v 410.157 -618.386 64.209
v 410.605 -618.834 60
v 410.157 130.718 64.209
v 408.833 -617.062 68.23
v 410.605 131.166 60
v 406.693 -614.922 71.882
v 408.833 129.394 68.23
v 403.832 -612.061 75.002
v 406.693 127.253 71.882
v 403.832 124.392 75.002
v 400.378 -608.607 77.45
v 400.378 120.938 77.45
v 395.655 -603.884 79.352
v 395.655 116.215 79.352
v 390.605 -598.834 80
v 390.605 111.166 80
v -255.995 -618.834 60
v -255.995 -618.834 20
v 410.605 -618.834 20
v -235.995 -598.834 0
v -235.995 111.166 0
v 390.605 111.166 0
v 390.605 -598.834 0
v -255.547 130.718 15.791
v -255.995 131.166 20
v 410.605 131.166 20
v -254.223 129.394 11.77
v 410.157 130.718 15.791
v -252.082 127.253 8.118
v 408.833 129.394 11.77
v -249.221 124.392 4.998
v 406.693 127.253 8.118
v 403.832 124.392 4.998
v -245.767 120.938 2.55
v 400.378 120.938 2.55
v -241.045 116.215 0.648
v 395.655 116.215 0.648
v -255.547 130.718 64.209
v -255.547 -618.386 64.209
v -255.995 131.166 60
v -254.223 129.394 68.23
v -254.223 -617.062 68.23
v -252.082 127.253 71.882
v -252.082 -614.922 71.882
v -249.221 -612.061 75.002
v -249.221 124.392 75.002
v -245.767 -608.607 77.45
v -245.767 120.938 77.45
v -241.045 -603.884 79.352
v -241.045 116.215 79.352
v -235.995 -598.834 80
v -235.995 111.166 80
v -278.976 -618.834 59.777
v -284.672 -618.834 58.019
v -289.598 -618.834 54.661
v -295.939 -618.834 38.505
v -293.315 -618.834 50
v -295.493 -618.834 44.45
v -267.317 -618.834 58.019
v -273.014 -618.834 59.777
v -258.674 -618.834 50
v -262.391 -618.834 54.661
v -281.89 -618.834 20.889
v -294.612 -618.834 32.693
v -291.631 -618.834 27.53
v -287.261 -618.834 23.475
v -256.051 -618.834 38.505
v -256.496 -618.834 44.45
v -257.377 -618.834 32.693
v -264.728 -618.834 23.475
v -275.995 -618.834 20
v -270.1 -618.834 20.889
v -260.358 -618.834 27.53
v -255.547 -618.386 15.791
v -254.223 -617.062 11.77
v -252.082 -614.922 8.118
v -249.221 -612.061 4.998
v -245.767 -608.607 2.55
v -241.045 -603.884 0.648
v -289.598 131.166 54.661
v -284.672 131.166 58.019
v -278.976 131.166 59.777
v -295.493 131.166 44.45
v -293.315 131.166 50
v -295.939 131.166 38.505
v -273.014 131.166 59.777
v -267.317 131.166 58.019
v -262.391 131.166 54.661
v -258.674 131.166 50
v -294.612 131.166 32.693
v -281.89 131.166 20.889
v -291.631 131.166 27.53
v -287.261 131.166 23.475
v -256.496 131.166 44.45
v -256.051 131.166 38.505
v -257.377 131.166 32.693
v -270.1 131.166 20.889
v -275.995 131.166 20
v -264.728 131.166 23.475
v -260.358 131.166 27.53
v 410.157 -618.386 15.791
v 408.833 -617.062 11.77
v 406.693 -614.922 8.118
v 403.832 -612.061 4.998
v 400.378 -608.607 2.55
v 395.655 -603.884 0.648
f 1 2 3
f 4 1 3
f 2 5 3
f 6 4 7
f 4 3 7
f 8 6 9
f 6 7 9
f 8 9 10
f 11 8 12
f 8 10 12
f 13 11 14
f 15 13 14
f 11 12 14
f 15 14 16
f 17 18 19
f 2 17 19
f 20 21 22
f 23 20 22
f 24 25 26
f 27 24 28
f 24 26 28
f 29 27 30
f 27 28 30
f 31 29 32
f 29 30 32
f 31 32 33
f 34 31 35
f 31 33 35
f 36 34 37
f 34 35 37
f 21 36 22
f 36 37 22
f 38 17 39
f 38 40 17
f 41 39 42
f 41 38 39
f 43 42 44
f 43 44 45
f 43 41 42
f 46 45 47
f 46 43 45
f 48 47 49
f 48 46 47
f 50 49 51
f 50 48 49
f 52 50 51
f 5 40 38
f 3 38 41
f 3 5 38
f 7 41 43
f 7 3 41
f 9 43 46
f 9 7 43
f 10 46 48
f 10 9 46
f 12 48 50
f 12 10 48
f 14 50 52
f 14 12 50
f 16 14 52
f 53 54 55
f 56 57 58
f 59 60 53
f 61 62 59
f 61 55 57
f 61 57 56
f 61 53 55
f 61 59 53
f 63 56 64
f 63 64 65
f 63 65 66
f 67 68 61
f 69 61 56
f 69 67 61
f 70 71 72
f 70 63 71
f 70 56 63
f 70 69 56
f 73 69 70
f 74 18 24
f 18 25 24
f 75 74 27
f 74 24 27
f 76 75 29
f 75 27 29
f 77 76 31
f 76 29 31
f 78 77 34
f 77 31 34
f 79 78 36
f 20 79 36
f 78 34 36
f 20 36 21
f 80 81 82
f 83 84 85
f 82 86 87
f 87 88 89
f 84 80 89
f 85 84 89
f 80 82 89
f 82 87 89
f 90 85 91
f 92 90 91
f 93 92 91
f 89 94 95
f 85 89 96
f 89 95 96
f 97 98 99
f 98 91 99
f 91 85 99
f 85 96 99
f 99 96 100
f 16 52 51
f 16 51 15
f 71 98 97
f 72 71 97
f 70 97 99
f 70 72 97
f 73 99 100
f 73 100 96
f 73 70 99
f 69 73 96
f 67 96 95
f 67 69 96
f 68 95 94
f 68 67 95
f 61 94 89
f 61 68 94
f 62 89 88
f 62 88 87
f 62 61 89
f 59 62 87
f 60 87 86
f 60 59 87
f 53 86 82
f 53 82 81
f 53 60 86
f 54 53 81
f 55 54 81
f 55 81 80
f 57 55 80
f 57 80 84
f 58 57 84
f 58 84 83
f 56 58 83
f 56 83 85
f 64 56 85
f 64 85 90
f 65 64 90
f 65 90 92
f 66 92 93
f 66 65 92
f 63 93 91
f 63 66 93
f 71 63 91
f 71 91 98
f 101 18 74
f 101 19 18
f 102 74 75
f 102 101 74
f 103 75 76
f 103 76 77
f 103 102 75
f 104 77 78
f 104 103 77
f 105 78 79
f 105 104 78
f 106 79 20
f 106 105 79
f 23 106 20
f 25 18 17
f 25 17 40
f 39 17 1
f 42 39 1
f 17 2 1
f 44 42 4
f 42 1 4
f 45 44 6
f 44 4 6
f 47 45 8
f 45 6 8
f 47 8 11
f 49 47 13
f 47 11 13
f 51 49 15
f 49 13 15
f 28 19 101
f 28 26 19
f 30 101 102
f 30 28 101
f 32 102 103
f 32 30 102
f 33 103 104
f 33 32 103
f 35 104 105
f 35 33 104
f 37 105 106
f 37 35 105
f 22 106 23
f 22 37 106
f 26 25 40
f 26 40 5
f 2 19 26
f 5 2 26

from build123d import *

# Parameters (mm, degrees)
SKETCH2_W           = 666.6
SKETCH2_H           = 750
BOSS_EXTRUDE1_DEPTH = 80
FILLET1_R           = 20
SKETCH3_R           = 20
BOSS_EXTRUDE2_DEPTH = 750


with BuildPart() as part:
    # Sketch2 → Boss-Extrude1 (new body)
    with BuildSketch(Plane.XY):
        with Locations((77.305323194, -243.834410646)):
            Rectangle(SKETCH2_W, SKETCH2_H)
    extrude(amount=BOSS_EXTRUDE1_DEPTH)

    # Fillet1
    fillet1_edges = [part.edges().sort_by_distance(p)[0] for p in [
        (410.605323194, -243.834410646, 80),
        (77.305323194, 131.165589354, 80),
        (-255.994676806, -243.834410646, 80),
        (77.305323194, 131.165589354, 0),
        (410.605323194, -243.834410646, 0),
        (77.305323194, -618.834410646, 0),
        (-255.994676806, -243.834410646, 0),
        (77.305323194, -618.834410646, 80),
    ]]
    fillet(fillet1_edges, radius=FILLET1_R)


with BuildPart() as body_2:
    # Sketch3 → Boss-Extrude2 (new body)
    with BuildSketch(Plane(origin=(0, -618.834410646, 0), x_dir=(-1, 0, 0), z_dir=(0, -1, 0))):
        with Locations(Location((275.994676806, -40, 0), (0, 0, 90))):
            Circle(SKETCH3_R)
    extrude(amount=-BOSS_EXTRUDE2_DEPTH)


solid = Compound([part.part, body_2.part])
